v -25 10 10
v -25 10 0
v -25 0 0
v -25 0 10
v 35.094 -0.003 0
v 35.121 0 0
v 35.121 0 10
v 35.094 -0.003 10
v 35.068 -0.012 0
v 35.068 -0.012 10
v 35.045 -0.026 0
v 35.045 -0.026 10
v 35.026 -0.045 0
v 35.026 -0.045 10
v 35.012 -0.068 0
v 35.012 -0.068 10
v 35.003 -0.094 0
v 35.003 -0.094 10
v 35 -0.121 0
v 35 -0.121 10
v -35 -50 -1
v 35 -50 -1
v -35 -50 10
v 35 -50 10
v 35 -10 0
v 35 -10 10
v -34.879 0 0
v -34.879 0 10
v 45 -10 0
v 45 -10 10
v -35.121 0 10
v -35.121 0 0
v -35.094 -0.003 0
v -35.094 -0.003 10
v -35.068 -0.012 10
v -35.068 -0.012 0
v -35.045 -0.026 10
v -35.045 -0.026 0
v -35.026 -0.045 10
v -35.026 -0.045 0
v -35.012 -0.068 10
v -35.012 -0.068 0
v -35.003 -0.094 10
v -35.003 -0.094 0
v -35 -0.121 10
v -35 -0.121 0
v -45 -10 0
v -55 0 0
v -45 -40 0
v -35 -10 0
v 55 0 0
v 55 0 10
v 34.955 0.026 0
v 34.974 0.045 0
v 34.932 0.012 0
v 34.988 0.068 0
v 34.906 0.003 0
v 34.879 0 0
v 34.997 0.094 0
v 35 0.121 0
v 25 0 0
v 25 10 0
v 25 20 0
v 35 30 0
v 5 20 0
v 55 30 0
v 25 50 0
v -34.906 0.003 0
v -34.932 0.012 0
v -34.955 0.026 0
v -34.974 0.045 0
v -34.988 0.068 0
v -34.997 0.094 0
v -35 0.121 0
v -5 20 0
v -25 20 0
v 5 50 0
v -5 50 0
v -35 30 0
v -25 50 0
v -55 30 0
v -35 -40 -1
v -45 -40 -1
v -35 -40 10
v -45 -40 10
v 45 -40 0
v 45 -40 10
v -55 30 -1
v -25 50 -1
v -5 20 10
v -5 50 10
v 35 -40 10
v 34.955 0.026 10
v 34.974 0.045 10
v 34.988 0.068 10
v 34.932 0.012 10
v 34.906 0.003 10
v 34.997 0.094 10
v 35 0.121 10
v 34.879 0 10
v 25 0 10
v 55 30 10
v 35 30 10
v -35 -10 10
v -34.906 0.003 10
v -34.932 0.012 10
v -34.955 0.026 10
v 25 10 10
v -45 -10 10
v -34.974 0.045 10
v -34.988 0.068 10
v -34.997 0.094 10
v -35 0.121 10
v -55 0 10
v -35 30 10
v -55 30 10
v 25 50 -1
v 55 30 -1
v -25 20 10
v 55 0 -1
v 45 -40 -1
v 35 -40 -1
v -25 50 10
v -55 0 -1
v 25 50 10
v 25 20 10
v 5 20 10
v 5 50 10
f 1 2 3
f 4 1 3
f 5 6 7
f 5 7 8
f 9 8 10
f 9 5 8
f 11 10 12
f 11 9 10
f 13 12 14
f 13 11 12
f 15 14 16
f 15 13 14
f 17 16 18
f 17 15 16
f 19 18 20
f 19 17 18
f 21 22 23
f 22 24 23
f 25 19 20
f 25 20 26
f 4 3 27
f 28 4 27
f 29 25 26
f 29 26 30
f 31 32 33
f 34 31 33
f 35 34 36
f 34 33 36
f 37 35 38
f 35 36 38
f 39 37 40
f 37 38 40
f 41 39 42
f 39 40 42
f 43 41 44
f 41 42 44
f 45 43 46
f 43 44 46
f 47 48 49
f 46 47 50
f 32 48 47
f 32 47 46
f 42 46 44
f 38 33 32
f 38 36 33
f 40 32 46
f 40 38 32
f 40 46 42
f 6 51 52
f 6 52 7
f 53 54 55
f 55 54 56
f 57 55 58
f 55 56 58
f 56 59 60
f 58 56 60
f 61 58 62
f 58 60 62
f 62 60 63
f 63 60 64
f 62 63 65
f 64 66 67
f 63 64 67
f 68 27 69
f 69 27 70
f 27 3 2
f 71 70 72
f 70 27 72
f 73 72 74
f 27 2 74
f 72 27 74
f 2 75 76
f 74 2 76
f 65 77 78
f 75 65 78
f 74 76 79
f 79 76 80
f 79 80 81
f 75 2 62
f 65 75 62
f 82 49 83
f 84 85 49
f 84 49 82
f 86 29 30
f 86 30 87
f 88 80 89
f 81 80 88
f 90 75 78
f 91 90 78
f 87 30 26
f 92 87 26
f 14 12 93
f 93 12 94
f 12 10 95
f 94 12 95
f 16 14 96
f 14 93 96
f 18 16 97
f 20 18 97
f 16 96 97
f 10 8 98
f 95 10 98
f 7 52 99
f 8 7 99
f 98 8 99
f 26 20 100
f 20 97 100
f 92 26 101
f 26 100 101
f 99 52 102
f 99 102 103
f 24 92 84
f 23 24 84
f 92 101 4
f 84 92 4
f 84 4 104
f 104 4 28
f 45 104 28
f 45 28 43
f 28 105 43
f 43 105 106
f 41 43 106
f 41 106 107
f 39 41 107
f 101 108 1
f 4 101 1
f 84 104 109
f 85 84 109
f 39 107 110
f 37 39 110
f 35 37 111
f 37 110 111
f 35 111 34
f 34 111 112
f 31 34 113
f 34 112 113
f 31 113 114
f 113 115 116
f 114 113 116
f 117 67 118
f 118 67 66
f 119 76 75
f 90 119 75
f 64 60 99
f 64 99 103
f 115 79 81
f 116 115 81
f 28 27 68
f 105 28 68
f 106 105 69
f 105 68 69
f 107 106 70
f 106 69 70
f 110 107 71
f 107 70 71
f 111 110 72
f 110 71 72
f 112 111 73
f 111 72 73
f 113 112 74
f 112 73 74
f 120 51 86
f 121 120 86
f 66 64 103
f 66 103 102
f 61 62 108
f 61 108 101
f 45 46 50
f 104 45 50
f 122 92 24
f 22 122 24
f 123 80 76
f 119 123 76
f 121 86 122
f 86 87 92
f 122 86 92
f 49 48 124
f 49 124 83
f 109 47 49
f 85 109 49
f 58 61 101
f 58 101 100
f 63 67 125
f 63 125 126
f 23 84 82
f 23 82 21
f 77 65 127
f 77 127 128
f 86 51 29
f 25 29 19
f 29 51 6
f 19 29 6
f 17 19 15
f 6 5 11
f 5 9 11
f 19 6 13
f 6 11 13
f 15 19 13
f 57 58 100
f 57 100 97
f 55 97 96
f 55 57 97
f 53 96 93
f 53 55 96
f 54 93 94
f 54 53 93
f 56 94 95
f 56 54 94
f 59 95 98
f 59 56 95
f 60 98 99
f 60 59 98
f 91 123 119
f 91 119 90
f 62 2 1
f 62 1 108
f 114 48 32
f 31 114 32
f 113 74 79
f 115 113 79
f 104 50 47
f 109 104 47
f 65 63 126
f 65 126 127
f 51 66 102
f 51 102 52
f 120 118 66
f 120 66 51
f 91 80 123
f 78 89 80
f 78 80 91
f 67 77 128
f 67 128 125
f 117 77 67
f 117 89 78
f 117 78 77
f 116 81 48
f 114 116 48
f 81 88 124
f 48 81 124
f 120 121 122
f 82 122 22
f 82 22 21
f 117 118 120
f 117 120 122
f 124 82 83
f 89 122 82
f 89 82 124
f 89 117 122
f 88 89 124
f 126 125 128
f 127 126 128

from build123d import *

# Parameters (mm, degrees)
F1_DEPTH = 1
F2_DEPTH = 10


with BuildPart() as f1:
    # F0 (on Top) → F1 (new body)
    with BuildSketch(Plane.XY):
        with BuildLine():
            Line((0, 10), (0, 50))
            Line((0, 50), (-5, 50))
            Line((-5, 50), (-5, 20))
            Line((-5, 20), (-15, 20))
            Line((-15, 20), (-25, 20))
            Line((-25, 20), (-25, 50))
            Line((-25, 50), (-55, 30))
            Line((-55, 30), (-35, 30))
            Line((-35, 30), (-35, 10))
            Line((-35, 10), (-35, 0.120711))
            ThreePointArc((-35, 0.120711), (-34.964645, 0.035355), (-34.879289, 0))
            Line((-34.879289, 0), (-25, 0))
            Line((-25, 0), (-25, 10))
            Line((-25, 10), (0, 10))
        make_face()
        Polygon((-5, 20), (-5, 50), (-25, 50), (-25, 20), (-15, 20), align=None)
        with BuildLine():
            Line((-35.120711, 0), (-55, 0))
            Line((-55, 0), (-45, -40))
            Line((-45, -40), (-45, -10))
            Line((-45, -10), (-35, -10))
            Line((-35, -10), (-35, -0.120711))
            ThreePointArc((-35, -0.120711), (-35.035355, -0.035355), (-35.120711, 0))
        make_face()
        with BuildLine():
            Line((0, -50), (0, 10))
            Line((0, 10), (-25, 10))
            Line((-25, 10), (-25, 0))
            Line((-25, 0), (-34.879289, 0))
            ThreePointArc((-34.879289, 0), (-34.964645, 0.035355), (-35, 0.120711))
            Line((-35, 0.120711), (-35, 10))
            Line((-35, 10), (-35, 30))
            Line((-35, 30), (-55, 30))
            Line((-55, 30), (-55, 0))
            Line((-55, 0), (-35.120711, 0))
            ThreePointArc((-35.120711, 0), (-35.035355, -0.035355), (-35, -0.120711))
            Line((-35, -0.120711), (-35, -10))
            Line((-35, -10), (-45, -10))
            Line((-45, -10), (-45, -40))
            Line((-45, -40), (-35, -40))
            Line((-35, -40), (-35, -50))
            Line((-35, -50), (0, -50))
        make_face()
    extrude(amount=-F1_DEPTH)

    # F0 (on Top) → F2 (join)
    with BuildSketch(Plane.XY):
        Polygon((-5, 20), (-5, 50), (-25, 50), (-25, 20), (-15, 20), align=None)
        with BuildLine():
            Line((0, -50), (0, 10))
            Line((0, 10), (-25, 10))
            Line((-25, 10), (-25, 0))
            Line((-25, 0), (-34.879289, 0))
            ThreePointArc((-34.879289, 0), (-34.964645, 0.035355), (-35, 0.120711))
            Line((-35, 0.120711), (-35, 10))
            Line((-35, 10), (-35, 30))
            Line((-35, 30), (-55, 30))
            Line((-55, 30), (-55, 0))
            Line((-55, 0), (-35.120711, 0))
            ThreePointArc((-35.120711, 0), (-35.035355, -0.035355), (-35, -0.120711))
            Line((-35, -0.120711), (-35, -10))
            Line((-35, -10), (-45, -10))
            Line((-45, -10), (-45, -40))
            Line((-45, -40), (-35, -40))
            Line((-35, -40), (-35, -50))
            Line((-35, -50), (0, -50))
        make_face()
    extrude(amount=F2_DEPTH)

    # F3: F1 across plane


with BuildPart() as f1_1:
    add(f1.part)
    add(f1.part.mirror(Plane.YZ))


solid = f1_1.part
